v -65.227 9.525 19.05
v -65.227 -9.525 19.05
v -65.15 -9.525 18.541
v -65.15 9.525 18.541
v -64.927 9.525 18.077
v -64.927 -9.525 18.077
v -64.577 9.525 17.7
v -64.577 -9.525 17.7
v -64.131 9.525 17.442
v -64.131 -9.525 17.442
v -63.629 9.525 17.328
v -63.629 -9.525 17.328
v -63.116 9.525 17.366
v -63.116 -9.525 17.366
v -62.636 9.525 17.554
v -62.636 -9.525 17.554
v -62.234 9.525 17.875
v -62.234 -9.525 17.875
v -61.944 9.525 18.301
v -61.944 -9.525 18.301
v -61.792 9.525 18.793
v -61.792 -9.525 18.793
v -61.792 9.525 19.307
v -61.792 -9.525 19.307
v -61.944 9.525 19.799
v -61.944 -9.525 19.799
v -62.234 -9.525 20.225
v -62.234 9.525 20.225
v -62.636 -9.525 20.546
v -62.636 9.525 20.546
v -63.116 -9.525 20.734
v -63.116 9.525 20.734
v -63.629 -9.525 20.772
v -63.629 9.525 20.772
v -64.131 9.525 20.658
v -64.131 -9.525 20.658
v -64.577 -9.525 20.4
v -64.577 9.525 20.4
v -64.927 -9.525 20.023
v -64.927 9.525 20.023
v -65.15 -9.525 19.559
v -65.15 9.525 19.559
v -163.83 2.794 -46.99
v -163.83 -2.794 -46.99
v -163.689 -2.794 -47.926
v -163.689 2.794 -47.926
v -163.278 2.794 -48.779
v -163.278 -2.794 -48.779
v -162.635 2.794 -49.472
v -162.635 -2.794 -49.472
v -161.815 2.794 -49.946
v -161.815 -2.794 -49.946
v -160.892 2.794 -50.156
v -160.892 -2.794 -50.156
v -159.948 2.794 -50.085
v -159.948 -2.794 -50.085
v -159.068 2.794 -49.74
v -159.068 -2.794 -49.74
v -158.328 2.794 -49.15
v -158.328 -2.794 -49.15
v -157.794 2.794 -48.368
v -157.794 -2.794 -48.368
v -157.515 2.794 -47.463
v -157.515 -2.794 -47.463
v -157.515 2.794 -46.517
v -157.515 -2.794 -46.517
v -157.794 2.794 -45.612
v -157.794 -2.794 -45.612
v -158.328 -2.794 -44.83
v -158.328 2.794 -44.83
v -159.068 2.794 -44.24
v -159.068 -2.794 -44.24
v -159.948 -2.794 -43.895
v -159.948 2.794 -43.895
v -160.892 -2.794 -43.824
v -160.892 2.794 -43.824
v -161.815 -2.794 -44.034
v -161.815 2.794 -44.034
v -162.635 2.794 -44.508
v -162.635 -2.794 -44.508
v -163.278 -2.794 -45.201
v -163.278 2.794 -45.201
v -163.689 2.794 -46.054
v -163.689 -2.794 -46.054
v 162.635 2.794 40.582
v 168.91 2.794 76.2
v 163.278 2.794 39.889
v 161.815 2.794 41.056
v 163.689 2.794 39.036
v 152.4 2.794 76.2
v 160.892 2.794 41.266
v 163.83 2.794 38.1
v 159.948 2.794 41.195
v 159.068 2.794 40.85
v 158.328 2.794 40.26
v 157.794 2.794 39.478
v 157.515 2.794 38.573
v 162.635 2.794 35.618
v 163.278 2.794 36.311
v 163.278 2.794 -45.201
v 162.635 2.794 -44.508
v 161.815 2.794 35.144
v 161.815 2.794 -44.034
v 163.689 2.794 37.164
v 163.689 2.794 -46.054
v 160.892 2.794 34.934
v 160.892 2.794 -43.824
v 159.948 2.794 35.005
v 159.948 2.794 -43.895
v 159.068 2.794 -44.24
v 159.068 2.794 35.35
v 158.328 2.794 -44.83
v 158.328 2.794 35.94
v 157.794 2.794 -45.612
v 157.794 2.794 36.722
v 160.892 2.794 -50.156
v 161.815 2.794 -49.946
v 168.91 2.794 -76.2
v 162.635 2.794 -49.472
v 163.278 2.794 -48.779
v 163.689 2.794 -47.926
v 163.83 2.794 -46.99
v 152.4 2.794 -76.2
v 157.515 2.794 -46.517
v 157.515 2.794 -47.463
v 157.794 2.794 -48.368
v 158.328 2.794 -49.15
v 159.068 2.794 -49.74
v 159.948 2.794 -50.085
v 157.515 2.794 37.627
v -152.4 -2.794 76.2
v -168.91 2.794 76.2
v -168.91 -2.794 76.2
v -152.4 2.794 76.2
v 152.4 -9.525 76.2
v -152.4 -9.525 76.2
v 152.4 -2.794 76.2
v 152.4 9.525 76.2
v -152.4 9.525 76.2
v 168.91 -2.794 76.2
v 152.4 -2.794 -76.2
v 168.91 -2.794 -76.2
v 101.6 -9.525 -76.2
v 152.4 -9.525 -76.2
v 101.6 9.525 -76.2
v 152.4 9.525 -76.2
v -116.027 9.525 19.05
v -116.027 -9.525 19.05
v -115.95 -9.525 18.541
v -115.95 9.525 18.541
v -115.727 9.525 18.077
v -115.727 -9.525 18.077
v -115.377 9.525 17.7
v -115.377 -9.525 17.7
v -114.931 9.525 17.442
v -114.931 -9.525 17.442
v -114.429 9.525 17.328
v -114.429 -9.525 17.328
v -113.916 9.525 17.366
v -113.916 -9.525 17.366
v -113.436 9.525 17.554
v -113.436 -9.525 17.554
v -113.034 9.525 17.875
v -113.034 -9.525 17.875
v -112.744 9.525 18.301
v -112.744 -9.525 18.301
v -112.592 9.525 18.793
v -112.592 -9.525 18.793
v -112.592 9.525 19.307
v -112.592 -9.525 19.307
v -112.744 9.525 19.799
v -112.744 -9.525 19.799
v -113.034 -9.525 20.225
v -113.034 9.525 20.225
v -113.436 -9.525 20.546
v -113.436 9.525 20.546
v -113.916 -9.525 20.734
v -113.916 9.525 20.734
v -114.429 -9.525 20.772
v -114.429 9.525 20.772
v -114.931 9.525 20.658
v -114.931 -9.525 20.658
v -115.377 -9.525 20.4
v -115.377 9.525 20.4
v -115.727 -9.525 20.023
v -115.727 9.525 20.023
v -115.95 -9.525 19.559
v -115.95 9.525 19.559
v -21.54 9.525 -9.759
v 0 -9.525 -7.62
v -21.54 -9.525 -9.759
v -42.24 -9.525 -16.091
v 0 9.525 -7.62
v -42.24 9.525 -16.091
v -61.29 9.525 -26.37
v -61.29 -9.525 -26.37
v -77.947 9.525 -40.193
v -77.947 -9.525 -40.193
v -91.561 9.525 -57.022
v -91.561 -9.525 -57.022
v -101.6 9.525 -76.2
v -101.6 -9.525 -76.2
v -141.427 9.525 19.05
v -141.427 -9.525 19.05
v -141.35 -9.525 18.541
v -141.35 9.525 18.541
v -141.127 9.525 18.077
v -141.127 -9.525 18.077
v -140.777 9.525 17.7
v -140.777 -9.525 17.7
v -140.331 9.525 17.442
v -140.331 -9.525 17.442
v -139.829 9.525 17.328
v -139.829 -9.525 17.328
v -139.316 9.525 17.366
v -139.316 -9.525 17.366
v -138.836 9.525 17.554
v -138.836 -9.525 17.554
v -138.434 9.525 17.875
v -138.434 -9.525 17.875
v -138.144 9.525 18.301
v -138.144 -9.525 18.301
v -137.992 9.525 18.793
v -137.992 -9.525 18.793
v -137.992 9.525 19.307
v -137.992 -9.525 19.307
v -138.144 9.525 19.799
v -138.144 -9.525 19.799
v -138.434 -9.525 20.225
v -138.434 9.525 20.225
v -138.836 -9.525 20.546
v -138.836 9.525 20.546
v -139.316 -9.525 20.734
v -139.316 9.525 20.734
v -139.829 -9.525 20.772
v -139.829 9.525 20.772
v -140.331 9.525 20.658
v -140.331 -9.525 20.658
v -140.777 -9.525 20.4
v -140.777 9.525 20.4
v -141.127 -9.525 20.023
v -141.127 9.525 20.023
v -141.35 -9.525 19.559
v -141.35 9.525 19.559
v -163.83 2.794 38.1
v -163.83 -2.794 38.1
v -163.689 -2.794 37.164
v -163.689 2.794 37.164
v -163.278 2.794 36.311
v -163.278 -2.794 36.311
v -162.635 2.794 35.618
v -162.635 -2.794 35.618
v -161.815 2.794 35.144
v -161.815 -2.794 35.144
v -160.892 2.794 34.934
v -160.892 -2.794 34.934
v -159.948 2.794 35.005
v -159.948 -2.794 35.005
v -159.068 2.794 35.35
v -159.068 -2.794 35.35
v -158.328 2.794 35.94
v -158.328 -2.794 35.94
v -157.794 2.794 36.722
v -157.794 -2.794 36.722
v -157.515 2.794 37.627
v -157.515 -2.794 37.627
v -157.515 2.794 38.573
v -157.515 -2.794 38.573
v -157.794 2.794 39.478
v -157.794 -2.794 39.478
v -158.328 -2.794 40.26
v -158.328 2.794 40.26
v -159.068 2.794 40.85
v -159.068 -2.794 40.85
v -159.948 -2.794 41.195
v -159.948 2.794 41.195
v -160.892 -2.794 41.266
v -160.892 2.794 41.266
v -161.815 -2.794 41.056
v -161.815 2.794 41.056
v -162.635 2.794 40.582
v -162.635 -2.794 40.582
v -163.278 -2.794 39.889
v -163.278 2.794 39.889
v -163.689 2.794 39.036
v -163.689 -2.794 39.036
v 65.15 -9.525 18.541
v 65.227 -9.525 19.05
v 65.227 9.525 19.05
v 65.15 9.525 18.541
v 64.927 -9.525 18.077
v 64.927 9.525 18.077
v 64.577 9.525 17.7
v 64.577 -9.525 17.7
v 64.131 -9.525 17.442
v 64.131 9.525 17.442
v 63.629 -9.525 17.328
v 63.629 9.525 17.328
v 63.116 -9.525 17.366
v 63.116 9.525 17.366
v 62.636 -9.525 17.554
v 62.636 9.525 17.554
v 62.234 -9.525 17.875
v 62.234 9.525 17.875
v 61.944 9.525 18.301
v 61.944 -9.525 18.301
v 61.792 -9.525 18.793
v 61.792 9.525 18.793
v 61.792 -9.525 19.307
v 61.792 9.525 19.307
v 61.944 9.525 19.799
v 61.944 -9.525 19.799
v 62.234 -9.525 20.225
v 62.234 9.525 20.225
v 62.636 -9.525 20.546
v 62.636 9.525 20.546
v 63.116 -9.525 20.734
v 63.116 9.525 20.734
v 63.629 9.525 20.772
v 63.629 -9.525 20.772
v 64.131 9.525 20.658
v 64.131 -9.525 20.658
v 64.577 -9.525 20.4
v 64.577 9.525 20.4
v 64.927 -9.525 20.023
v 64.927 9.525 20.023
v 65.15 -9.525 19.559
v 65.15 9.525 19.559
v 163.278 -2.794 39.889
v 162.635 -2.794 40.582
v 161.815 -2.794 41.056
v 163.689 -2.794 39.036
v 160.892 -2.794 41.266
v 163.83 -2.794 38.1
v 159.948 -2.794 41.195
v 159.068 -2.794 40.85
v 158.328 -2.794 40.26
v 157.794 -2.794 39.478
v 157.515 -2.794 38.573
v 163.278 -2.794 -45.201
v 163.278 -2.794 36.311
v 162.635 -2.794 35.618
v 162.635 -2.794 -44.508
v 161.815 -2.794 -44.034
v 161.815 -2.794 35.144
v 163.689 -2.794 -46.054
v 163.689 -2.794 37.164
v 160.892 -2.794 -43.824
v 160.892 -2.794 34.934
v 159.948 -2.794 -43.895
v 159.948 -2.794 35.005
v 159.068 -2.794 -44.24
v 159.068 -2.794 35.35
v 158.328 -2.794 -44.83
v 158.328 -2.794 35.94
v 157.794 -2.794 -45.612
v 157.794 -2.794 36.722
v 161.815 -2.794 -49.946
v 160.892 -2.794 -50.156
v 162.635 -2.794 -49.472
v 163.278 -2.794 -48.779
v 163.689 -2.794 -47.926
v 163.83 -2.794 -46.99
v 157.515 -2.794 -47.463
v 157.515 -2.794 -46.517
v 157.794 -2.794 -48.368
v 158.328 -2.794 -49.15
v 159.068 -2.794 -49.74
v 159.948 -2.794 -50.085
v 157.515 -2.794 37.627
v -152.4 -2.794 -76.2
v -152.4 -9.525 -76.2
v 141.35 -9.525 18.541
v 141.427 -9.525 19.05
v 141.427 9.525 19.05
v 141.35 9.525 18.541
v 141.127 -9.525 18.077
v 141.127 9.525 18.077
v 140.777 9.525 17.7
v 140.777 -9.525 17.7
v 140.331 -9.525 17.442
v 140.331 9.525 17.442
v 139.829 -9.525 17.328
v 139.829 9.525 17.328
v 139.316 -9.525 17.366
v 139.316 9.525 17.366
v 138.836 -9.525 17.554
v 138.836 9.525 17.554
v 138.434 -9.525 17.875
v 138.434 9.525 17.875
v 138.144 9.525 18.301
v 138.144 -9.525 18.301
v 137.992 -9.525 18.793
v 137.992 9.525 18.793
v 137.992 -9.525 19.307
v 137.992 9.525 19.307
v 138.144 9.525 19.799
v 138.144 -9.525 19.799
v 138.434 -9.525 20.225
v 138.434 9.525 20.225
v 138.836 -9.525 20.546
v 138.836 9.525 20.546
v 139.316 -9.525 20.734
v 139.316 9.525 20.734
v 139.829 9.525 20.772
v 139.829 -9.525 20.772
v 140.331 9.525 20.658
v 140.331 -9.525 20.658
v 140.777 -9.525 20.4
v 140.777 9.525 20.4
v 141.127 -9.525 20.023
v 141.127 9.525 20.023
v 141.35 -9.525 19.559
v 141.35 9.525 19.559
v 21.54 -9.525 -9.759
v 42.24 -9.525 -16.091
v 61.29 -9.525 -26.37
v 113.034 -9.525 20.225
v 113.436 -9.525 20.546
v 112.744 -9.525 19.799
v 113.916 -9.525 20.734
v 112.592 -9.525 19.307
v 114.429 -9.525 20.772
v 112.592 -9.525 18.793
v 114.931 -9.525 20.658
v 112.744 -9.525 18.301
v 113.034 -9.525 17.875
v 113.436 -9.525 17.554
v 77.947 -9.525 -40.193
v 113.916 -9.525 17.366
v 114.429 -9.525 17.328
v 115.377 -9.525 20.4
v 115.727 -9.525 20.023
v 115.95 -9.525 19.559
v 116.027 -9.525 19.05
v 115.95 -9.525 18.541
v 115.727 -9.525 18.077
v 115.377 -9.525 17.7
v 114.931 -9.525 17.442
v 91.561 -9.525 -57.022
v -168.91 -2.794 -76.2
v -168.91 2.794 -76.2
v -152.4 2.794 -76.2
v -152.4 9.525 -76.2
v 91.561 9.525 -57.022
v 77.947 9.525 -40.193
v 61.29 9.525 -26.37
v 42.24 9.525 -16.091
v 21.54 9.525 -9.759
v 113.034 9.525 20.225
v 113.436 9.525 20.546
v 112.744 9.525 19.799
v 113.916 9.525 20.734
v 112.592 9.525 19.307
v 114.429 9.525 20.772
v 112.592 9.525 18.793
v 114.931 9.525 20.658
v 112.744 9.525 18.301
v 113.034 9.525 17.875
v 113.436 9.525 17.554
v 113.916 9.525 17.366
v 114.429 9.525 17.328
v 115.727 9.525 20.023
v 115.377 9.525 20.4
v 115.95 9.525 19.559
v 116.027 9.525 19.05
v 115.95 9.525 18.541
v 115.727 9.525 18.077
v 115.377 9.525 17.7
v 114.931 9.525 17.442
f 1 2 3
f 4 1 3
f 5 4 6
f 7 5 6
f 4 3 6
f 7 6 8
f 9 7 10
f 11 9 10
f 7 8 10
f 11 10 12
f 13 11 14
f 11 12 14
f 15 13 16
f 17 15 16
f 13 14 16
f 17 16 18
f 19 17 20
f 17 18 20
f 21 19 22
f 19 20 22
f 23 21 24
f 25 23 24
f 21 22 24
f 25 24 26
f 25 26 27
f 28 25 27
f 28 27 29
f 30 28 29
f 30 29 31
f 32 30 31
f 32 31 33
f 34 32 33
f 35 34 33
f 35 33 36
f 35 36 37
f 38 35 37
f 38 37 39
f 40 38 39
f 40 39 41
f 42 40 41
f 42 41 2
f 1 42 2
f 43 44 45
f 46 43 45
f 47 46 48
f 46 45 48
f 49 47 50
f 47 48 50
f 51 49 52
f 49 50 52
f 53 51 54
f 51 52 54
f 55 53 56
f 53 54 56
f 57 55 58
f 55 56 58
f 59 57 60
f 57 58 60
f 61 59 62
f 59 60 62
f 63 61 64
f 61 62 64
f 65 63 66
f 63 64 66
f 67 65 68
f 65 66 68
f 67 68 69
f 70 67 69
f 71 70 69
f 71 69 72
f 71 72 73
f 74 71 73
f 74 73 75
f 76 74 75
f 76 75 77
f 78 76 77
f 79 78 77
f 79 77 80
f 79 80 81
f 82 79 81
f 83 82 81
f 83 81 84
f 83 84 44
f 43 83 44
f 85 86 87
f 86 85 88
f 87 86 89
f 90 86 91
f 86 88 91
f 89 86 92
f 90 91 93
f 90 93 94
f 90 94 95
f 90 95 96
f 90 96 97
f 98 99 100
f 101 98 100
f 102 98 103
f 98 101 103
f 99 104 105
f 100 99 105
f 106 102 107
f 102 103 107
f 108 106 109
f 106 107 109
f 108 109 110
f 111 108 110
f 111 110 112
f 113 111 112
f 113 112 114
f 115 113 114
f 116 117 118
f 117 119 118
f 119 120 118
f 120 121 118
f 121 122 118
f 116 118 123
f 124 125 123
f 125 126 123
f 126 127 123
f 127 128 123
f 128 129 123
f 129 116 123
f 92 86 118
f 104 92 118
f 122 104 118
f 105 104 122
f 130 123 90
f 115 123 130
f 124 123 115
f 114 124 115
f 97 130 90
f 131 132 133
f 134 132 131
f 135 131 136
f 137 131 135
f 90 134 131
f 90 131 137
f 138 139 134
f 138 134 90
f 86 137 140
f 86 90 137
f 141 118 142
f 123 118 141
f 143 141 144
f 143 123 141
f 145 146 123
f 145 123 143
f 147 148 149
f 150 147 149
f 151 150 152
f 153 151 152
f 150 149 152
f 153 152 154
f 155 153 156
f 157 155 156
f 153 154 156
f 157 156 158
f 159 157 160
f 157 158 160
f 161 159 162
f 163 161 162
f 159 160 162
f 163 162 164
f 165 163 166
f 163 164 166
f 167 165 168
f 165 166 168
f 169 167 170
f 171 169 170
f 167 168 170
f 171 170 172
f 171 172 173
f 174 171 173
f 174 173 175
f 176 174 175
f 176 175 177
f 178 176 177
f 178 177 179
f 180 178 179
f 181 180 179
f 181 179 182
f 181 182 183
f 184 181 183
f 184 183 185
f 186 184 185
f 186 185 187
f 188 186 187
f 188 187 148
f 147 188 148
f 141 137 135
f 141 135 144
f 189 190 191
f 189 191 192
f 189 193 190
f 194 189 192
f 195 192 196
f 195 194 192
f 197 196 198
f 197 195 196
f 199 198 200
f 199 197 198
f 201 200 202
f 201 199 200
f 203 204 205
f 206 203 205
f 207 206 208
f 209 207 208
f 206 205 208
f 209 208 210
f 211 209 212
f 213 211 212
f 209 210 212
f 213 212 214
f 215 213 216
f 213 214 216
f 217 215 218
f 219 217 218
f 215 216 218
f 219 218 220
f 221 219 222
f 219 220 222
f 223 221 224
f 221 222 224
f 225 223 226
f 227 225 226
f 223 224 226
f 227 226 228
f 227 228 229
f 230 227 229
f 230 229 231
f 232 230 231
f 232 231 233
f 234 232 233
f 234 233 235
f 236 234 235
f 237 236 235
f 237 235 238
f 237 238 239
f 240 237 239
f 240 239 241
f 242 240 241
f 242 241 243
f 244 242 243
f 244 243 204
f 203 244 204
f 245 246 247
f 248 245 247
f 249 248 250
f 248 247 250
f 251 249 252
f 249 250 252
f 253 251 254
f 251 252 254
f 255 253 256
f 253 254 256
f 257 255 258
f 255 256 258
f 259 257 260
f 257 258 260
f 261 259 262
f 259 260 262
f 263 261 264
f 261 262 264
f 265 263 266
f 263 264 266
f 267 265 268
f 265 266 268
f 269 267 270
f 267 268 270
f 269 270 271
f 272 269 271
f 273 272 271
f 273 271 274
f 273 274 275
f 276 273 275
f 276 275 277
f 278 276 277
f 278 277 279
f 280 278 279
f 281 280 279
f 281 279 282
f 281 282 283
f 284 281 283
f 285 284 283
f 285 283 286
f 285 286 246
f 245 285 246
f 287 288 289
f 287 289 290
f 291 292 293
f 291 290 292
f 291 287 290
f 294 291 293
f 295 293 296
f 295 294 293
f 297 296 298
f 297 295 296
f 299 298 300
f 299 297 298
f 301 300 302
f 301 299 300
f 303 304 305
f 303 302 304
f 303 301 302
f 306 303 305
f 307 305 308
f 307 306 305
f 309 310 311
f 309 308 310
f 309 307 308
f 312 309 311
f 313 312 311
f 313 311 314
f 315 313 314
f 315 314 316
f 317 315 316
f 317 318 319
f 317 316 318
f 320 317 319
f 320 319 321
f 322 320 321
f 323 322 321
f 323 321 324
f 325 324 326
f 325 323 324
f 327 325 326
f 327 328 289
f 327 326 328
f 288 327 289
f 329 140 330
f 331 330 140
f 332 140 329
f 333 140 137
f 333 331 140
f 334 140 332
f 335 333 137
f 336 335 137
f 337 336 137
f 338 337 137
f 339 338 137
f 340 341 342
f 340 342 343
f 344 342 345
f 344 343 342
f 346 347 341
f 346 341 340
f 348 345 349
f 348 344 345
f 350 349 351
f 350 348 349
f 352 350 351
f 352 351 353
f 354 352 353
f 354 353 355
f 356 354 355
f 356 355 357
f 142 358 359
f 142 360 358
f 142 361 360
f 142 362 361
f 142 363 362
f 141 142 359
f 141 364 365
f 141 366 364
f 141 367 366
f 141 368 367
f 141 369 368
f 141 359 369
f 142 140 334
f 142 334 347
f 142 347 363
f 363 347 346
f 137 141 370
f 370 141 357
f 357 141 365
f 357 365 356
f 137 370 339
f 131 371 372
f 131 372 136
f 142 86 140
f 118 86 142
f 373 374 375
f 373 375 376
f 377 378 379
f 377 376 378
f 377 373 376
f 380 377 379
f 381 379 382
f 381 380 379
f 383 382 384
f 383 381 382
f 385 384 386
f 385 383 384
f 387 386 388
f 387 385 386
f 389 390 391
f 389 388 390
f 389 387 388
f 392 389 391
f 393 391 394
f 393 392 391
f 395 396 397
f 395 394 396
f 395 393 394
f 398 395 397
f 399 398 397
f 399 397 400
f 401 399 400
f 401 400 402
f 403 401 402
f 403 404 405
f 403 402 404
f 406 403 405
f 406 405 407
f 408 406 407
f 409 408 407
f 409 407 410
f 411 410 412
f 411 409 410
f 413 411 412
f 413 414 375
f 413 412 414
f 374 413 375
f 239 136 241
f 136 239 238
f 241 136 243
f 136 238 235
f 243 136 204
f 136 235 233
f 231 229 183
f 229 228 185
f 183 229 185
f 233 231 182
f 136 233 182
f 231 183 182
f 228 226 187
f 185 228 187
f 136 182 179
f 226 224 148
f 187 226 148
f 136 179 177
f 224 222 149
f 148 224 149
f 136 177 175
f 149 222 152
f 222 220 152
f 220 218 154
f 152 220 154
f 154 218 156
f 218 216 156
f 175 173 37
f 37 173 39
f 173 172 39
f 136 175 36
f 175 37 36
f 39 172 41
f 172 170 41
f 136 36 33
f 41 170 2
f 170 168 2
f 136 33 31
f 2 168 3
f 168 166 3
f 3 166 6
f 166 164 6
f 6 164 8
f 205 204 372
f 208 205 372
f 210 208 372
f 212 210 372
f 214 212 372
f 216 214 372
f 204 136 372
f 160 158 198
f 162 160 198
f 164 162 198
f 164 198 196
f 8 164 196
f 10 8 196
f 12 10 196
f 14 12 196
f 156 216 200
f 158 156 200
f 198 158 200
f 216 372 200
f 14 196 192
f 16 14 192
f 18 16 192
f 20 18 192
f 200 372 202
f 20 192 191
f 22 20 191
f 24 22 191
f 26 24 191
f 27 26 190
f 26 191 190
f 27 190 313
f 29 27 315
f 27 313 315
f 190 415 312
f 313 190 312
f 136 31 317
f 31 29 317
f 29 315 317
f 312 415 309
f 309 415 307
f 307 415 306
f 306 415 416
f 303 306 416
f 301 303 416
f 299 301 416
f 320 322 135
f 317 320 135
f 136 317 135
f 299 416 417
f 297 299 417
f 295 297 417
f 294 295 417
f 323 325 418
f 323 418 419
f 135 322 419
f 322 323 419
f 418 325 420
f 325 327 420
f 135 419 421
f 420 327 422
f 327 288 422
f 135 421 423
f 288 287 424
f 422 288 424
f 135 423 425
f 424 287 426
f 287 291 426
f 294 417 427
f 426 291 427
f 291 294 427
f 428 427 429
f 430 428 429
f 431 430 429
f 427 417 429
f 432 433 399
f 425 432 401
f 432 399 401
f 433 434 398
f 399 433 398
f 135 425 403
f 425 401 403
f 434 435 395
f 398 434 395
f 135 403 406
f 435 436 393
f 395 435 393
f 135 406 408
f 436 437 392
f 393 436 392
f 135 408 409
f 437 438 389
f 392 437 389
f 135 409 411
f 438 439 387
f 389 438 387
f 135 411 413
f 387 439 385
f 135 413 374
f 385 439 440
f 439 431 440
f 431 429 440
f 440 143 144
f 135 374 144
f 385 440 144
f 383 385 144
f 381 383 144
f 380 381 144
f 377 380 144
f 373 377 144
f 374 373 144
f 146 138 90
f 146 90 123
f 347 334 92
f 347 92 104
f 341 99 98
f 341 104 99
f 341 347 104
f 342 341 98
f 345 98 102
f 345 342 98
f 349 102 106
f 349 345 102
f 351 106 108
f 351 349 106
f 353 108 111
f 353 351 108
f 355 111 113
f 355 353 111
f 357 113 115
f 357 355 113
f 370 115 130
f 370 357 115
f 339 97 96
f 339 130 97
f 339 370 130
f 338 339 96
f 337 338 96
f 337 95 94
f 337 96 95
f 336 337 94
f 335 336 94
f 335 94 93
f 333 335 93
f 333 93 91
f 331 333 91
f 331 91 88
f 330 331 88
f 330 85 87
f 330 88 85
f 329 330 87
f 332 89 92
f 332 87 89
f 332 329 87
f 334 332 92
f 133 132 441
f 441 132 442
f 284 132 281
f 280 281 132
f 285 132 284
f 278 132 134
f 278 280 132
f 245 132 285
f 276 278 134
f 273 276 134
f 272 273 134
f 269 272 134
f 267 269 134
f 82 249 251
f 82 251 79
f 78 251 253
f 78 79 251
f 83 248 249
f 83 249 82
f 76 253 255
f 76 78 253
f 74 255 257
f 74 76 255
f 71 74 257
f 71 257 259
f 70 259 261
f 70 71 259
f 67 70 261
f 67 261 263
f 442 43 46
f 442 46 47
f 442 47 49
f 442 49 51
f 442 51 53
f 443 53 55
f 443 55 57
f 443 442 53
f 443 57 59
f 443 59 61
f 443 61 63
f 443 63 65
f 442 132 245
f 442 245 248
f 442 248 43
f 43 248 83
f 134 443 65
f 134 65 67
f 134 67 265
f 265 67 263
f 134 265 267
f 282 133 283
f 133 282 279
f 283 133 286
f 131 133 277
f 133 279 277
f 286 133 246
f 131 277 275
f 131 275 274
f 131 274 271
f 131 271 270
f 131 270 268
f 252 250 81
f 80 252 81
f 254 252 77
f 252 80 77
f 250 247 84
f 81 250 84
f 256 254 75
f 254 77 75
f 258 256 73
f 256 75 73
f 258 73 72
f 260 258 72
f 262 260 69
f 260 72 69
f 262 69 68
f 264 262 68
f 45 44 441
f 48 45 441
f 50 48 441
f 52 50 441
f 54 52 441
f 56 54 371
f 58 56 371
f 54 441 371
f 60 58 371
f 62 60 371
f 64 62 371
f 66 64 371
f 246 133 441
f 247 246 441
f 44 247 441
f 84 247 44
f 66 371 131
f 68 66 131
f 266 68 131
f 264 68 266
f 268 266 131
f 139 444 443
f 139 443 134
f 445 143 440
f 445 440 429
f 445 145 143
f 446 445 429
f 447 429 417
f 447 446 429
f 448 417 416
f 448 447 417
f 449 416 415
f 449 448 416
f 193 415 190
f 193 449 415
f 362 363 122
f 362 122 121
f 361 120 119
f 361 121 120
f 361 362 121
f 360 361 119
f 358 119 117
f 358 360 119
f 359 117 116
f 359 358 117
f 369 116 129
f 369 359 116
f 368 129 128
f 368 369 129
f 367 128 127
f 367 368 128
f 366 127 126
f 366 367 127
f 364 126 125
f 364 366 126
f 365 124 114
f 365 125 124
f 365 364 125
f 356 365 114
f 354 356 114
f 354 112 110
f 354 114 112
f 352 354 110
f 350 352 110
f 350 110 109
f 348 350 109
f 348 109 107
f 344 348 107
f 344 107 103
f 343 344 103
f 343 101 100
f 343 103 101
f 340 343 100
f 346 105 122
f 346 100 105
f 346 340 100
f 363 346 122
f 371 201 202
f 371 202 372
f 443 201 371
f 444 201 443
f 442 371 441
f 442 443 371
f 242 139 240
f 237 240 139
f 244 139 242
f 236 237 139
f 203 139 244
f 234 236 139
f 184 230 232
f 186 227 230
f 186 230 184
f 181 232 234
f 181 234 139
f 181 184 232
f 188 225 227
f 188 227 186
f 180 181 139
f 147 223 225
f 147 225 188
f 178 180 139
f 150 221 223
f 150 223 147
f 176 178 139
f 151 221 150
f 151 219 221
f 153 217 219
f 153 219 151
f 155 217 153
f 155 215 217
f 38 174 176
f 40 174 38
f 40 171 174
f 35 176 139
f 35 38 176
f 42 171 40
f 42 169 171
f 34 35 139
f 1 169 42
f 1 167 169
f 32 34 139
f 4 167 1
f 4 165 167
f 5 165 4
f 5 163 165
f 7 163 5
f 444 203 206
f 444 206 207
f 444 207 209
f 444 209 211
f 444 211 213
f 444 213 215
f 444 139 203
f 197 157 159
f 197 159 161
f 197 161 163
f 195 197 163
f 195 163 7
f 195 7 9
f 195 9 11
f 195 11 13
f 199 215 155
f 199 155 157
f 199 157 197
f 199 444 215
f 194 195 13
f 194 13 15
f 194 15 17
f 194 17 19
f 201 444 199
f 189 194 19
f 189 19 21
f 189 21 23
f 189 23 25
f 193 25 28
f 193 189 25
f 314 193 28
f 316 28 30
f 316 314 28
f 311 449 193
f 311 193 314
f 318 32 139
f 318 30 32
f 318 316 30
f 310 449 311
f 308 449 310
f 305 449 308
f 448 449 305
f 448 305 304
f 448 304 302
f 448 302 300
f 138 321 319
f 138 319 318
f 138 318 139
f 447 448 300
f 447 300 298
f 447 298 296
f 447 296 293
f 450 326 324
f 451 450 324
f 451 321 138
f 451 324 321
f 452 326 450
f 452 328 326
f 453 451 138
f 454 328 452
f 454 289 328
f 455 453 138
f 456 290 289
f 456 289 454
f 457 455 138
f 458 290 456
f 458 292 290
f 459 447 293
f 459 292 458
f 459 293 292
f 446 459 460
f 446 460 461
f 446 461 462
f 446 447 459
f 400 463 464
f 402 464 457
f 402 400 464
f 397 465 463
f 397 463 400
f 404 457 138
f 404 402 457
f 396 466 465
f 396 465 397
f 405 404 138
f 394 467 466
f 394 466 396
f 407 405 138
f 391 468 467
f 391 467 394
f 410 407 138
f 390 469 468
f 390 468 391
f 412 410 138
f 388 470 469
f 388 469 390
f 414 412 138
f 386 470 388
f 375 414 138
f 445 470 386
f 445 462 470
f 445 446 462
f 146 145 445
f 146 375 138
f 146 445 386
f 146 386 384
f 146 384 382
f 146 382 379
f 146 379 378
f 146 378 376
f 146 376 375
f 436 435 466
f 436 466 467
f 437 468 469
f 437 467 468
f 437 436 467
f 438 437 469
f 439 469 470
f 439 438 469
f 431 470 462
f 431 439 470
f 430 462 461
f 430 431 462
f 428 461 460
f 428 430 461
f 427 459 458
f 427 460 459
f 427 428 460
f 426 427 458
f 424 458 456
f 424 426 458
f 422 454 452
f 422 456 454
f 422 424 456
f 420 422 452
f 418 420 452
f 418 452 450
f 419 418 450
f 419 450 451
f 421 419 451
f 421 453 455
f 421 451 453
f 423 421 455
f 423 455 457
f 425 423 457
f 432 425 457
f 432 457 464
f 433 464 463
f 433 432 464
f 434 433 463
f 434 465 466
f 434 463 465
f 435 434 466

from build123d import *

# Parameters (mm, degrees)
BOSS_EXTRUDE1_DEPTH         = 9.525
F_8_32_TAPPED_HOLE1_D       = 3.4544
SKETCH6_W                   = 16.51
SKETCH6_H                   = 152.4
BOSS_EXTRUDE2_DEPTH         = 2.794
F_1_4_0_25_DIAMETER_HOLE1_D = 6.35


with BuildPart() as part:
    # Sketch1 → Boss-Extrude1 (new, symmetric)
    with BuildSketch(Plane(origin=(0, 0, 0), x_dir=(1, 0, 0), z_dir=(0, 1, 0))):
        with BuildLine():
            ThreePointArc((0, 7.62), (-61.289836841, 26.369500976), (-101.6, 76.2))
            Line((-101.6, 76.2), (-152.4, 76.2))
            Line((-152.4, 76.2), (-152.4, -76.2))
            Line((-152.4, -76.2), (152.4, -76.2))
            Line((152.4, -76.2), (152.4, 76.2))
            Line((152.4, 76.2), (101.6, 76.2))
            ThreePointArc((101.6, 76.2), (61.289836841, 26.369500976), (0, 7.62))
        make_face()
    extrude(amount=BOSS_EXTRUDE1_DEPTH, both=True)

    # #8-32 Tapped Hole1 (through all)
    with Locations(Plane(origin=(0, 9.525, 0), x_dir=(1, 0, 0), z_dir=(0, 1, 0))):
        with Locations((-139.7, -19.05), (-114.3, -19.05), (-63.5, -19.05)):
            f_8_32_tapped_hole1 = Hole(F_8_32_TAPPED_HOLE1_D / 2)

    # Mirror1: #8-32 Tapped Hole1 across plane
    add(f_8_32_tapped_hole1.mirror(Plane(origin=(0, 0, 0), x_dir=(0, 0, 1), z_dir=(1, 0, 0))), mode=Mode.SUBTRACT)

    # Sketch6 → Boss-Extrude2 (add, symmetric)
    with BuildSketch(Plane(origin=(0, 0, 0), x_dir=(1, 0, 0), z_dir=(0, 1, 0))):
        with Locations((-160.655, 0)):
            Rectangle(SKETCH6_W, SKETCH6_H)
    boss_extrude2 = extrude(amount=BOSS_EXTRUDE2_DEPTH, both=True)

    # 1/4 (0.25) Diameter Hole1 (through all)
    with Locations(Plane(origin=(0, 2.794, 0), x_dir=(1, 0, 0), z_dir=(0, 1, 0))):
        with Locations((-160.655, 46.99), (-160.655, -38.1)):
            f_1_4_0_25_diameter_hole1 = Hole(F_1_4_0_25_DIAMETER_HOLE1_D / 2)

    # Mirror2: Boss-Extrude2, 1/4 (0.25) Diameter Hole1 across plane
    add(boss_extrude2.mirror(Plane(origin=(0, 0, 0), x_dir=(0, 0, 1), z_dir=(1, 0, 0))))
    add(f_1_4_0_25_diameter_hole1.mirror(Plane(origin=(0, 0, 0), x_dir=(0, 0, 1), z_dir=(1, 0, 0))), mode=Mode.SUBTRACT)


solid = part.part
